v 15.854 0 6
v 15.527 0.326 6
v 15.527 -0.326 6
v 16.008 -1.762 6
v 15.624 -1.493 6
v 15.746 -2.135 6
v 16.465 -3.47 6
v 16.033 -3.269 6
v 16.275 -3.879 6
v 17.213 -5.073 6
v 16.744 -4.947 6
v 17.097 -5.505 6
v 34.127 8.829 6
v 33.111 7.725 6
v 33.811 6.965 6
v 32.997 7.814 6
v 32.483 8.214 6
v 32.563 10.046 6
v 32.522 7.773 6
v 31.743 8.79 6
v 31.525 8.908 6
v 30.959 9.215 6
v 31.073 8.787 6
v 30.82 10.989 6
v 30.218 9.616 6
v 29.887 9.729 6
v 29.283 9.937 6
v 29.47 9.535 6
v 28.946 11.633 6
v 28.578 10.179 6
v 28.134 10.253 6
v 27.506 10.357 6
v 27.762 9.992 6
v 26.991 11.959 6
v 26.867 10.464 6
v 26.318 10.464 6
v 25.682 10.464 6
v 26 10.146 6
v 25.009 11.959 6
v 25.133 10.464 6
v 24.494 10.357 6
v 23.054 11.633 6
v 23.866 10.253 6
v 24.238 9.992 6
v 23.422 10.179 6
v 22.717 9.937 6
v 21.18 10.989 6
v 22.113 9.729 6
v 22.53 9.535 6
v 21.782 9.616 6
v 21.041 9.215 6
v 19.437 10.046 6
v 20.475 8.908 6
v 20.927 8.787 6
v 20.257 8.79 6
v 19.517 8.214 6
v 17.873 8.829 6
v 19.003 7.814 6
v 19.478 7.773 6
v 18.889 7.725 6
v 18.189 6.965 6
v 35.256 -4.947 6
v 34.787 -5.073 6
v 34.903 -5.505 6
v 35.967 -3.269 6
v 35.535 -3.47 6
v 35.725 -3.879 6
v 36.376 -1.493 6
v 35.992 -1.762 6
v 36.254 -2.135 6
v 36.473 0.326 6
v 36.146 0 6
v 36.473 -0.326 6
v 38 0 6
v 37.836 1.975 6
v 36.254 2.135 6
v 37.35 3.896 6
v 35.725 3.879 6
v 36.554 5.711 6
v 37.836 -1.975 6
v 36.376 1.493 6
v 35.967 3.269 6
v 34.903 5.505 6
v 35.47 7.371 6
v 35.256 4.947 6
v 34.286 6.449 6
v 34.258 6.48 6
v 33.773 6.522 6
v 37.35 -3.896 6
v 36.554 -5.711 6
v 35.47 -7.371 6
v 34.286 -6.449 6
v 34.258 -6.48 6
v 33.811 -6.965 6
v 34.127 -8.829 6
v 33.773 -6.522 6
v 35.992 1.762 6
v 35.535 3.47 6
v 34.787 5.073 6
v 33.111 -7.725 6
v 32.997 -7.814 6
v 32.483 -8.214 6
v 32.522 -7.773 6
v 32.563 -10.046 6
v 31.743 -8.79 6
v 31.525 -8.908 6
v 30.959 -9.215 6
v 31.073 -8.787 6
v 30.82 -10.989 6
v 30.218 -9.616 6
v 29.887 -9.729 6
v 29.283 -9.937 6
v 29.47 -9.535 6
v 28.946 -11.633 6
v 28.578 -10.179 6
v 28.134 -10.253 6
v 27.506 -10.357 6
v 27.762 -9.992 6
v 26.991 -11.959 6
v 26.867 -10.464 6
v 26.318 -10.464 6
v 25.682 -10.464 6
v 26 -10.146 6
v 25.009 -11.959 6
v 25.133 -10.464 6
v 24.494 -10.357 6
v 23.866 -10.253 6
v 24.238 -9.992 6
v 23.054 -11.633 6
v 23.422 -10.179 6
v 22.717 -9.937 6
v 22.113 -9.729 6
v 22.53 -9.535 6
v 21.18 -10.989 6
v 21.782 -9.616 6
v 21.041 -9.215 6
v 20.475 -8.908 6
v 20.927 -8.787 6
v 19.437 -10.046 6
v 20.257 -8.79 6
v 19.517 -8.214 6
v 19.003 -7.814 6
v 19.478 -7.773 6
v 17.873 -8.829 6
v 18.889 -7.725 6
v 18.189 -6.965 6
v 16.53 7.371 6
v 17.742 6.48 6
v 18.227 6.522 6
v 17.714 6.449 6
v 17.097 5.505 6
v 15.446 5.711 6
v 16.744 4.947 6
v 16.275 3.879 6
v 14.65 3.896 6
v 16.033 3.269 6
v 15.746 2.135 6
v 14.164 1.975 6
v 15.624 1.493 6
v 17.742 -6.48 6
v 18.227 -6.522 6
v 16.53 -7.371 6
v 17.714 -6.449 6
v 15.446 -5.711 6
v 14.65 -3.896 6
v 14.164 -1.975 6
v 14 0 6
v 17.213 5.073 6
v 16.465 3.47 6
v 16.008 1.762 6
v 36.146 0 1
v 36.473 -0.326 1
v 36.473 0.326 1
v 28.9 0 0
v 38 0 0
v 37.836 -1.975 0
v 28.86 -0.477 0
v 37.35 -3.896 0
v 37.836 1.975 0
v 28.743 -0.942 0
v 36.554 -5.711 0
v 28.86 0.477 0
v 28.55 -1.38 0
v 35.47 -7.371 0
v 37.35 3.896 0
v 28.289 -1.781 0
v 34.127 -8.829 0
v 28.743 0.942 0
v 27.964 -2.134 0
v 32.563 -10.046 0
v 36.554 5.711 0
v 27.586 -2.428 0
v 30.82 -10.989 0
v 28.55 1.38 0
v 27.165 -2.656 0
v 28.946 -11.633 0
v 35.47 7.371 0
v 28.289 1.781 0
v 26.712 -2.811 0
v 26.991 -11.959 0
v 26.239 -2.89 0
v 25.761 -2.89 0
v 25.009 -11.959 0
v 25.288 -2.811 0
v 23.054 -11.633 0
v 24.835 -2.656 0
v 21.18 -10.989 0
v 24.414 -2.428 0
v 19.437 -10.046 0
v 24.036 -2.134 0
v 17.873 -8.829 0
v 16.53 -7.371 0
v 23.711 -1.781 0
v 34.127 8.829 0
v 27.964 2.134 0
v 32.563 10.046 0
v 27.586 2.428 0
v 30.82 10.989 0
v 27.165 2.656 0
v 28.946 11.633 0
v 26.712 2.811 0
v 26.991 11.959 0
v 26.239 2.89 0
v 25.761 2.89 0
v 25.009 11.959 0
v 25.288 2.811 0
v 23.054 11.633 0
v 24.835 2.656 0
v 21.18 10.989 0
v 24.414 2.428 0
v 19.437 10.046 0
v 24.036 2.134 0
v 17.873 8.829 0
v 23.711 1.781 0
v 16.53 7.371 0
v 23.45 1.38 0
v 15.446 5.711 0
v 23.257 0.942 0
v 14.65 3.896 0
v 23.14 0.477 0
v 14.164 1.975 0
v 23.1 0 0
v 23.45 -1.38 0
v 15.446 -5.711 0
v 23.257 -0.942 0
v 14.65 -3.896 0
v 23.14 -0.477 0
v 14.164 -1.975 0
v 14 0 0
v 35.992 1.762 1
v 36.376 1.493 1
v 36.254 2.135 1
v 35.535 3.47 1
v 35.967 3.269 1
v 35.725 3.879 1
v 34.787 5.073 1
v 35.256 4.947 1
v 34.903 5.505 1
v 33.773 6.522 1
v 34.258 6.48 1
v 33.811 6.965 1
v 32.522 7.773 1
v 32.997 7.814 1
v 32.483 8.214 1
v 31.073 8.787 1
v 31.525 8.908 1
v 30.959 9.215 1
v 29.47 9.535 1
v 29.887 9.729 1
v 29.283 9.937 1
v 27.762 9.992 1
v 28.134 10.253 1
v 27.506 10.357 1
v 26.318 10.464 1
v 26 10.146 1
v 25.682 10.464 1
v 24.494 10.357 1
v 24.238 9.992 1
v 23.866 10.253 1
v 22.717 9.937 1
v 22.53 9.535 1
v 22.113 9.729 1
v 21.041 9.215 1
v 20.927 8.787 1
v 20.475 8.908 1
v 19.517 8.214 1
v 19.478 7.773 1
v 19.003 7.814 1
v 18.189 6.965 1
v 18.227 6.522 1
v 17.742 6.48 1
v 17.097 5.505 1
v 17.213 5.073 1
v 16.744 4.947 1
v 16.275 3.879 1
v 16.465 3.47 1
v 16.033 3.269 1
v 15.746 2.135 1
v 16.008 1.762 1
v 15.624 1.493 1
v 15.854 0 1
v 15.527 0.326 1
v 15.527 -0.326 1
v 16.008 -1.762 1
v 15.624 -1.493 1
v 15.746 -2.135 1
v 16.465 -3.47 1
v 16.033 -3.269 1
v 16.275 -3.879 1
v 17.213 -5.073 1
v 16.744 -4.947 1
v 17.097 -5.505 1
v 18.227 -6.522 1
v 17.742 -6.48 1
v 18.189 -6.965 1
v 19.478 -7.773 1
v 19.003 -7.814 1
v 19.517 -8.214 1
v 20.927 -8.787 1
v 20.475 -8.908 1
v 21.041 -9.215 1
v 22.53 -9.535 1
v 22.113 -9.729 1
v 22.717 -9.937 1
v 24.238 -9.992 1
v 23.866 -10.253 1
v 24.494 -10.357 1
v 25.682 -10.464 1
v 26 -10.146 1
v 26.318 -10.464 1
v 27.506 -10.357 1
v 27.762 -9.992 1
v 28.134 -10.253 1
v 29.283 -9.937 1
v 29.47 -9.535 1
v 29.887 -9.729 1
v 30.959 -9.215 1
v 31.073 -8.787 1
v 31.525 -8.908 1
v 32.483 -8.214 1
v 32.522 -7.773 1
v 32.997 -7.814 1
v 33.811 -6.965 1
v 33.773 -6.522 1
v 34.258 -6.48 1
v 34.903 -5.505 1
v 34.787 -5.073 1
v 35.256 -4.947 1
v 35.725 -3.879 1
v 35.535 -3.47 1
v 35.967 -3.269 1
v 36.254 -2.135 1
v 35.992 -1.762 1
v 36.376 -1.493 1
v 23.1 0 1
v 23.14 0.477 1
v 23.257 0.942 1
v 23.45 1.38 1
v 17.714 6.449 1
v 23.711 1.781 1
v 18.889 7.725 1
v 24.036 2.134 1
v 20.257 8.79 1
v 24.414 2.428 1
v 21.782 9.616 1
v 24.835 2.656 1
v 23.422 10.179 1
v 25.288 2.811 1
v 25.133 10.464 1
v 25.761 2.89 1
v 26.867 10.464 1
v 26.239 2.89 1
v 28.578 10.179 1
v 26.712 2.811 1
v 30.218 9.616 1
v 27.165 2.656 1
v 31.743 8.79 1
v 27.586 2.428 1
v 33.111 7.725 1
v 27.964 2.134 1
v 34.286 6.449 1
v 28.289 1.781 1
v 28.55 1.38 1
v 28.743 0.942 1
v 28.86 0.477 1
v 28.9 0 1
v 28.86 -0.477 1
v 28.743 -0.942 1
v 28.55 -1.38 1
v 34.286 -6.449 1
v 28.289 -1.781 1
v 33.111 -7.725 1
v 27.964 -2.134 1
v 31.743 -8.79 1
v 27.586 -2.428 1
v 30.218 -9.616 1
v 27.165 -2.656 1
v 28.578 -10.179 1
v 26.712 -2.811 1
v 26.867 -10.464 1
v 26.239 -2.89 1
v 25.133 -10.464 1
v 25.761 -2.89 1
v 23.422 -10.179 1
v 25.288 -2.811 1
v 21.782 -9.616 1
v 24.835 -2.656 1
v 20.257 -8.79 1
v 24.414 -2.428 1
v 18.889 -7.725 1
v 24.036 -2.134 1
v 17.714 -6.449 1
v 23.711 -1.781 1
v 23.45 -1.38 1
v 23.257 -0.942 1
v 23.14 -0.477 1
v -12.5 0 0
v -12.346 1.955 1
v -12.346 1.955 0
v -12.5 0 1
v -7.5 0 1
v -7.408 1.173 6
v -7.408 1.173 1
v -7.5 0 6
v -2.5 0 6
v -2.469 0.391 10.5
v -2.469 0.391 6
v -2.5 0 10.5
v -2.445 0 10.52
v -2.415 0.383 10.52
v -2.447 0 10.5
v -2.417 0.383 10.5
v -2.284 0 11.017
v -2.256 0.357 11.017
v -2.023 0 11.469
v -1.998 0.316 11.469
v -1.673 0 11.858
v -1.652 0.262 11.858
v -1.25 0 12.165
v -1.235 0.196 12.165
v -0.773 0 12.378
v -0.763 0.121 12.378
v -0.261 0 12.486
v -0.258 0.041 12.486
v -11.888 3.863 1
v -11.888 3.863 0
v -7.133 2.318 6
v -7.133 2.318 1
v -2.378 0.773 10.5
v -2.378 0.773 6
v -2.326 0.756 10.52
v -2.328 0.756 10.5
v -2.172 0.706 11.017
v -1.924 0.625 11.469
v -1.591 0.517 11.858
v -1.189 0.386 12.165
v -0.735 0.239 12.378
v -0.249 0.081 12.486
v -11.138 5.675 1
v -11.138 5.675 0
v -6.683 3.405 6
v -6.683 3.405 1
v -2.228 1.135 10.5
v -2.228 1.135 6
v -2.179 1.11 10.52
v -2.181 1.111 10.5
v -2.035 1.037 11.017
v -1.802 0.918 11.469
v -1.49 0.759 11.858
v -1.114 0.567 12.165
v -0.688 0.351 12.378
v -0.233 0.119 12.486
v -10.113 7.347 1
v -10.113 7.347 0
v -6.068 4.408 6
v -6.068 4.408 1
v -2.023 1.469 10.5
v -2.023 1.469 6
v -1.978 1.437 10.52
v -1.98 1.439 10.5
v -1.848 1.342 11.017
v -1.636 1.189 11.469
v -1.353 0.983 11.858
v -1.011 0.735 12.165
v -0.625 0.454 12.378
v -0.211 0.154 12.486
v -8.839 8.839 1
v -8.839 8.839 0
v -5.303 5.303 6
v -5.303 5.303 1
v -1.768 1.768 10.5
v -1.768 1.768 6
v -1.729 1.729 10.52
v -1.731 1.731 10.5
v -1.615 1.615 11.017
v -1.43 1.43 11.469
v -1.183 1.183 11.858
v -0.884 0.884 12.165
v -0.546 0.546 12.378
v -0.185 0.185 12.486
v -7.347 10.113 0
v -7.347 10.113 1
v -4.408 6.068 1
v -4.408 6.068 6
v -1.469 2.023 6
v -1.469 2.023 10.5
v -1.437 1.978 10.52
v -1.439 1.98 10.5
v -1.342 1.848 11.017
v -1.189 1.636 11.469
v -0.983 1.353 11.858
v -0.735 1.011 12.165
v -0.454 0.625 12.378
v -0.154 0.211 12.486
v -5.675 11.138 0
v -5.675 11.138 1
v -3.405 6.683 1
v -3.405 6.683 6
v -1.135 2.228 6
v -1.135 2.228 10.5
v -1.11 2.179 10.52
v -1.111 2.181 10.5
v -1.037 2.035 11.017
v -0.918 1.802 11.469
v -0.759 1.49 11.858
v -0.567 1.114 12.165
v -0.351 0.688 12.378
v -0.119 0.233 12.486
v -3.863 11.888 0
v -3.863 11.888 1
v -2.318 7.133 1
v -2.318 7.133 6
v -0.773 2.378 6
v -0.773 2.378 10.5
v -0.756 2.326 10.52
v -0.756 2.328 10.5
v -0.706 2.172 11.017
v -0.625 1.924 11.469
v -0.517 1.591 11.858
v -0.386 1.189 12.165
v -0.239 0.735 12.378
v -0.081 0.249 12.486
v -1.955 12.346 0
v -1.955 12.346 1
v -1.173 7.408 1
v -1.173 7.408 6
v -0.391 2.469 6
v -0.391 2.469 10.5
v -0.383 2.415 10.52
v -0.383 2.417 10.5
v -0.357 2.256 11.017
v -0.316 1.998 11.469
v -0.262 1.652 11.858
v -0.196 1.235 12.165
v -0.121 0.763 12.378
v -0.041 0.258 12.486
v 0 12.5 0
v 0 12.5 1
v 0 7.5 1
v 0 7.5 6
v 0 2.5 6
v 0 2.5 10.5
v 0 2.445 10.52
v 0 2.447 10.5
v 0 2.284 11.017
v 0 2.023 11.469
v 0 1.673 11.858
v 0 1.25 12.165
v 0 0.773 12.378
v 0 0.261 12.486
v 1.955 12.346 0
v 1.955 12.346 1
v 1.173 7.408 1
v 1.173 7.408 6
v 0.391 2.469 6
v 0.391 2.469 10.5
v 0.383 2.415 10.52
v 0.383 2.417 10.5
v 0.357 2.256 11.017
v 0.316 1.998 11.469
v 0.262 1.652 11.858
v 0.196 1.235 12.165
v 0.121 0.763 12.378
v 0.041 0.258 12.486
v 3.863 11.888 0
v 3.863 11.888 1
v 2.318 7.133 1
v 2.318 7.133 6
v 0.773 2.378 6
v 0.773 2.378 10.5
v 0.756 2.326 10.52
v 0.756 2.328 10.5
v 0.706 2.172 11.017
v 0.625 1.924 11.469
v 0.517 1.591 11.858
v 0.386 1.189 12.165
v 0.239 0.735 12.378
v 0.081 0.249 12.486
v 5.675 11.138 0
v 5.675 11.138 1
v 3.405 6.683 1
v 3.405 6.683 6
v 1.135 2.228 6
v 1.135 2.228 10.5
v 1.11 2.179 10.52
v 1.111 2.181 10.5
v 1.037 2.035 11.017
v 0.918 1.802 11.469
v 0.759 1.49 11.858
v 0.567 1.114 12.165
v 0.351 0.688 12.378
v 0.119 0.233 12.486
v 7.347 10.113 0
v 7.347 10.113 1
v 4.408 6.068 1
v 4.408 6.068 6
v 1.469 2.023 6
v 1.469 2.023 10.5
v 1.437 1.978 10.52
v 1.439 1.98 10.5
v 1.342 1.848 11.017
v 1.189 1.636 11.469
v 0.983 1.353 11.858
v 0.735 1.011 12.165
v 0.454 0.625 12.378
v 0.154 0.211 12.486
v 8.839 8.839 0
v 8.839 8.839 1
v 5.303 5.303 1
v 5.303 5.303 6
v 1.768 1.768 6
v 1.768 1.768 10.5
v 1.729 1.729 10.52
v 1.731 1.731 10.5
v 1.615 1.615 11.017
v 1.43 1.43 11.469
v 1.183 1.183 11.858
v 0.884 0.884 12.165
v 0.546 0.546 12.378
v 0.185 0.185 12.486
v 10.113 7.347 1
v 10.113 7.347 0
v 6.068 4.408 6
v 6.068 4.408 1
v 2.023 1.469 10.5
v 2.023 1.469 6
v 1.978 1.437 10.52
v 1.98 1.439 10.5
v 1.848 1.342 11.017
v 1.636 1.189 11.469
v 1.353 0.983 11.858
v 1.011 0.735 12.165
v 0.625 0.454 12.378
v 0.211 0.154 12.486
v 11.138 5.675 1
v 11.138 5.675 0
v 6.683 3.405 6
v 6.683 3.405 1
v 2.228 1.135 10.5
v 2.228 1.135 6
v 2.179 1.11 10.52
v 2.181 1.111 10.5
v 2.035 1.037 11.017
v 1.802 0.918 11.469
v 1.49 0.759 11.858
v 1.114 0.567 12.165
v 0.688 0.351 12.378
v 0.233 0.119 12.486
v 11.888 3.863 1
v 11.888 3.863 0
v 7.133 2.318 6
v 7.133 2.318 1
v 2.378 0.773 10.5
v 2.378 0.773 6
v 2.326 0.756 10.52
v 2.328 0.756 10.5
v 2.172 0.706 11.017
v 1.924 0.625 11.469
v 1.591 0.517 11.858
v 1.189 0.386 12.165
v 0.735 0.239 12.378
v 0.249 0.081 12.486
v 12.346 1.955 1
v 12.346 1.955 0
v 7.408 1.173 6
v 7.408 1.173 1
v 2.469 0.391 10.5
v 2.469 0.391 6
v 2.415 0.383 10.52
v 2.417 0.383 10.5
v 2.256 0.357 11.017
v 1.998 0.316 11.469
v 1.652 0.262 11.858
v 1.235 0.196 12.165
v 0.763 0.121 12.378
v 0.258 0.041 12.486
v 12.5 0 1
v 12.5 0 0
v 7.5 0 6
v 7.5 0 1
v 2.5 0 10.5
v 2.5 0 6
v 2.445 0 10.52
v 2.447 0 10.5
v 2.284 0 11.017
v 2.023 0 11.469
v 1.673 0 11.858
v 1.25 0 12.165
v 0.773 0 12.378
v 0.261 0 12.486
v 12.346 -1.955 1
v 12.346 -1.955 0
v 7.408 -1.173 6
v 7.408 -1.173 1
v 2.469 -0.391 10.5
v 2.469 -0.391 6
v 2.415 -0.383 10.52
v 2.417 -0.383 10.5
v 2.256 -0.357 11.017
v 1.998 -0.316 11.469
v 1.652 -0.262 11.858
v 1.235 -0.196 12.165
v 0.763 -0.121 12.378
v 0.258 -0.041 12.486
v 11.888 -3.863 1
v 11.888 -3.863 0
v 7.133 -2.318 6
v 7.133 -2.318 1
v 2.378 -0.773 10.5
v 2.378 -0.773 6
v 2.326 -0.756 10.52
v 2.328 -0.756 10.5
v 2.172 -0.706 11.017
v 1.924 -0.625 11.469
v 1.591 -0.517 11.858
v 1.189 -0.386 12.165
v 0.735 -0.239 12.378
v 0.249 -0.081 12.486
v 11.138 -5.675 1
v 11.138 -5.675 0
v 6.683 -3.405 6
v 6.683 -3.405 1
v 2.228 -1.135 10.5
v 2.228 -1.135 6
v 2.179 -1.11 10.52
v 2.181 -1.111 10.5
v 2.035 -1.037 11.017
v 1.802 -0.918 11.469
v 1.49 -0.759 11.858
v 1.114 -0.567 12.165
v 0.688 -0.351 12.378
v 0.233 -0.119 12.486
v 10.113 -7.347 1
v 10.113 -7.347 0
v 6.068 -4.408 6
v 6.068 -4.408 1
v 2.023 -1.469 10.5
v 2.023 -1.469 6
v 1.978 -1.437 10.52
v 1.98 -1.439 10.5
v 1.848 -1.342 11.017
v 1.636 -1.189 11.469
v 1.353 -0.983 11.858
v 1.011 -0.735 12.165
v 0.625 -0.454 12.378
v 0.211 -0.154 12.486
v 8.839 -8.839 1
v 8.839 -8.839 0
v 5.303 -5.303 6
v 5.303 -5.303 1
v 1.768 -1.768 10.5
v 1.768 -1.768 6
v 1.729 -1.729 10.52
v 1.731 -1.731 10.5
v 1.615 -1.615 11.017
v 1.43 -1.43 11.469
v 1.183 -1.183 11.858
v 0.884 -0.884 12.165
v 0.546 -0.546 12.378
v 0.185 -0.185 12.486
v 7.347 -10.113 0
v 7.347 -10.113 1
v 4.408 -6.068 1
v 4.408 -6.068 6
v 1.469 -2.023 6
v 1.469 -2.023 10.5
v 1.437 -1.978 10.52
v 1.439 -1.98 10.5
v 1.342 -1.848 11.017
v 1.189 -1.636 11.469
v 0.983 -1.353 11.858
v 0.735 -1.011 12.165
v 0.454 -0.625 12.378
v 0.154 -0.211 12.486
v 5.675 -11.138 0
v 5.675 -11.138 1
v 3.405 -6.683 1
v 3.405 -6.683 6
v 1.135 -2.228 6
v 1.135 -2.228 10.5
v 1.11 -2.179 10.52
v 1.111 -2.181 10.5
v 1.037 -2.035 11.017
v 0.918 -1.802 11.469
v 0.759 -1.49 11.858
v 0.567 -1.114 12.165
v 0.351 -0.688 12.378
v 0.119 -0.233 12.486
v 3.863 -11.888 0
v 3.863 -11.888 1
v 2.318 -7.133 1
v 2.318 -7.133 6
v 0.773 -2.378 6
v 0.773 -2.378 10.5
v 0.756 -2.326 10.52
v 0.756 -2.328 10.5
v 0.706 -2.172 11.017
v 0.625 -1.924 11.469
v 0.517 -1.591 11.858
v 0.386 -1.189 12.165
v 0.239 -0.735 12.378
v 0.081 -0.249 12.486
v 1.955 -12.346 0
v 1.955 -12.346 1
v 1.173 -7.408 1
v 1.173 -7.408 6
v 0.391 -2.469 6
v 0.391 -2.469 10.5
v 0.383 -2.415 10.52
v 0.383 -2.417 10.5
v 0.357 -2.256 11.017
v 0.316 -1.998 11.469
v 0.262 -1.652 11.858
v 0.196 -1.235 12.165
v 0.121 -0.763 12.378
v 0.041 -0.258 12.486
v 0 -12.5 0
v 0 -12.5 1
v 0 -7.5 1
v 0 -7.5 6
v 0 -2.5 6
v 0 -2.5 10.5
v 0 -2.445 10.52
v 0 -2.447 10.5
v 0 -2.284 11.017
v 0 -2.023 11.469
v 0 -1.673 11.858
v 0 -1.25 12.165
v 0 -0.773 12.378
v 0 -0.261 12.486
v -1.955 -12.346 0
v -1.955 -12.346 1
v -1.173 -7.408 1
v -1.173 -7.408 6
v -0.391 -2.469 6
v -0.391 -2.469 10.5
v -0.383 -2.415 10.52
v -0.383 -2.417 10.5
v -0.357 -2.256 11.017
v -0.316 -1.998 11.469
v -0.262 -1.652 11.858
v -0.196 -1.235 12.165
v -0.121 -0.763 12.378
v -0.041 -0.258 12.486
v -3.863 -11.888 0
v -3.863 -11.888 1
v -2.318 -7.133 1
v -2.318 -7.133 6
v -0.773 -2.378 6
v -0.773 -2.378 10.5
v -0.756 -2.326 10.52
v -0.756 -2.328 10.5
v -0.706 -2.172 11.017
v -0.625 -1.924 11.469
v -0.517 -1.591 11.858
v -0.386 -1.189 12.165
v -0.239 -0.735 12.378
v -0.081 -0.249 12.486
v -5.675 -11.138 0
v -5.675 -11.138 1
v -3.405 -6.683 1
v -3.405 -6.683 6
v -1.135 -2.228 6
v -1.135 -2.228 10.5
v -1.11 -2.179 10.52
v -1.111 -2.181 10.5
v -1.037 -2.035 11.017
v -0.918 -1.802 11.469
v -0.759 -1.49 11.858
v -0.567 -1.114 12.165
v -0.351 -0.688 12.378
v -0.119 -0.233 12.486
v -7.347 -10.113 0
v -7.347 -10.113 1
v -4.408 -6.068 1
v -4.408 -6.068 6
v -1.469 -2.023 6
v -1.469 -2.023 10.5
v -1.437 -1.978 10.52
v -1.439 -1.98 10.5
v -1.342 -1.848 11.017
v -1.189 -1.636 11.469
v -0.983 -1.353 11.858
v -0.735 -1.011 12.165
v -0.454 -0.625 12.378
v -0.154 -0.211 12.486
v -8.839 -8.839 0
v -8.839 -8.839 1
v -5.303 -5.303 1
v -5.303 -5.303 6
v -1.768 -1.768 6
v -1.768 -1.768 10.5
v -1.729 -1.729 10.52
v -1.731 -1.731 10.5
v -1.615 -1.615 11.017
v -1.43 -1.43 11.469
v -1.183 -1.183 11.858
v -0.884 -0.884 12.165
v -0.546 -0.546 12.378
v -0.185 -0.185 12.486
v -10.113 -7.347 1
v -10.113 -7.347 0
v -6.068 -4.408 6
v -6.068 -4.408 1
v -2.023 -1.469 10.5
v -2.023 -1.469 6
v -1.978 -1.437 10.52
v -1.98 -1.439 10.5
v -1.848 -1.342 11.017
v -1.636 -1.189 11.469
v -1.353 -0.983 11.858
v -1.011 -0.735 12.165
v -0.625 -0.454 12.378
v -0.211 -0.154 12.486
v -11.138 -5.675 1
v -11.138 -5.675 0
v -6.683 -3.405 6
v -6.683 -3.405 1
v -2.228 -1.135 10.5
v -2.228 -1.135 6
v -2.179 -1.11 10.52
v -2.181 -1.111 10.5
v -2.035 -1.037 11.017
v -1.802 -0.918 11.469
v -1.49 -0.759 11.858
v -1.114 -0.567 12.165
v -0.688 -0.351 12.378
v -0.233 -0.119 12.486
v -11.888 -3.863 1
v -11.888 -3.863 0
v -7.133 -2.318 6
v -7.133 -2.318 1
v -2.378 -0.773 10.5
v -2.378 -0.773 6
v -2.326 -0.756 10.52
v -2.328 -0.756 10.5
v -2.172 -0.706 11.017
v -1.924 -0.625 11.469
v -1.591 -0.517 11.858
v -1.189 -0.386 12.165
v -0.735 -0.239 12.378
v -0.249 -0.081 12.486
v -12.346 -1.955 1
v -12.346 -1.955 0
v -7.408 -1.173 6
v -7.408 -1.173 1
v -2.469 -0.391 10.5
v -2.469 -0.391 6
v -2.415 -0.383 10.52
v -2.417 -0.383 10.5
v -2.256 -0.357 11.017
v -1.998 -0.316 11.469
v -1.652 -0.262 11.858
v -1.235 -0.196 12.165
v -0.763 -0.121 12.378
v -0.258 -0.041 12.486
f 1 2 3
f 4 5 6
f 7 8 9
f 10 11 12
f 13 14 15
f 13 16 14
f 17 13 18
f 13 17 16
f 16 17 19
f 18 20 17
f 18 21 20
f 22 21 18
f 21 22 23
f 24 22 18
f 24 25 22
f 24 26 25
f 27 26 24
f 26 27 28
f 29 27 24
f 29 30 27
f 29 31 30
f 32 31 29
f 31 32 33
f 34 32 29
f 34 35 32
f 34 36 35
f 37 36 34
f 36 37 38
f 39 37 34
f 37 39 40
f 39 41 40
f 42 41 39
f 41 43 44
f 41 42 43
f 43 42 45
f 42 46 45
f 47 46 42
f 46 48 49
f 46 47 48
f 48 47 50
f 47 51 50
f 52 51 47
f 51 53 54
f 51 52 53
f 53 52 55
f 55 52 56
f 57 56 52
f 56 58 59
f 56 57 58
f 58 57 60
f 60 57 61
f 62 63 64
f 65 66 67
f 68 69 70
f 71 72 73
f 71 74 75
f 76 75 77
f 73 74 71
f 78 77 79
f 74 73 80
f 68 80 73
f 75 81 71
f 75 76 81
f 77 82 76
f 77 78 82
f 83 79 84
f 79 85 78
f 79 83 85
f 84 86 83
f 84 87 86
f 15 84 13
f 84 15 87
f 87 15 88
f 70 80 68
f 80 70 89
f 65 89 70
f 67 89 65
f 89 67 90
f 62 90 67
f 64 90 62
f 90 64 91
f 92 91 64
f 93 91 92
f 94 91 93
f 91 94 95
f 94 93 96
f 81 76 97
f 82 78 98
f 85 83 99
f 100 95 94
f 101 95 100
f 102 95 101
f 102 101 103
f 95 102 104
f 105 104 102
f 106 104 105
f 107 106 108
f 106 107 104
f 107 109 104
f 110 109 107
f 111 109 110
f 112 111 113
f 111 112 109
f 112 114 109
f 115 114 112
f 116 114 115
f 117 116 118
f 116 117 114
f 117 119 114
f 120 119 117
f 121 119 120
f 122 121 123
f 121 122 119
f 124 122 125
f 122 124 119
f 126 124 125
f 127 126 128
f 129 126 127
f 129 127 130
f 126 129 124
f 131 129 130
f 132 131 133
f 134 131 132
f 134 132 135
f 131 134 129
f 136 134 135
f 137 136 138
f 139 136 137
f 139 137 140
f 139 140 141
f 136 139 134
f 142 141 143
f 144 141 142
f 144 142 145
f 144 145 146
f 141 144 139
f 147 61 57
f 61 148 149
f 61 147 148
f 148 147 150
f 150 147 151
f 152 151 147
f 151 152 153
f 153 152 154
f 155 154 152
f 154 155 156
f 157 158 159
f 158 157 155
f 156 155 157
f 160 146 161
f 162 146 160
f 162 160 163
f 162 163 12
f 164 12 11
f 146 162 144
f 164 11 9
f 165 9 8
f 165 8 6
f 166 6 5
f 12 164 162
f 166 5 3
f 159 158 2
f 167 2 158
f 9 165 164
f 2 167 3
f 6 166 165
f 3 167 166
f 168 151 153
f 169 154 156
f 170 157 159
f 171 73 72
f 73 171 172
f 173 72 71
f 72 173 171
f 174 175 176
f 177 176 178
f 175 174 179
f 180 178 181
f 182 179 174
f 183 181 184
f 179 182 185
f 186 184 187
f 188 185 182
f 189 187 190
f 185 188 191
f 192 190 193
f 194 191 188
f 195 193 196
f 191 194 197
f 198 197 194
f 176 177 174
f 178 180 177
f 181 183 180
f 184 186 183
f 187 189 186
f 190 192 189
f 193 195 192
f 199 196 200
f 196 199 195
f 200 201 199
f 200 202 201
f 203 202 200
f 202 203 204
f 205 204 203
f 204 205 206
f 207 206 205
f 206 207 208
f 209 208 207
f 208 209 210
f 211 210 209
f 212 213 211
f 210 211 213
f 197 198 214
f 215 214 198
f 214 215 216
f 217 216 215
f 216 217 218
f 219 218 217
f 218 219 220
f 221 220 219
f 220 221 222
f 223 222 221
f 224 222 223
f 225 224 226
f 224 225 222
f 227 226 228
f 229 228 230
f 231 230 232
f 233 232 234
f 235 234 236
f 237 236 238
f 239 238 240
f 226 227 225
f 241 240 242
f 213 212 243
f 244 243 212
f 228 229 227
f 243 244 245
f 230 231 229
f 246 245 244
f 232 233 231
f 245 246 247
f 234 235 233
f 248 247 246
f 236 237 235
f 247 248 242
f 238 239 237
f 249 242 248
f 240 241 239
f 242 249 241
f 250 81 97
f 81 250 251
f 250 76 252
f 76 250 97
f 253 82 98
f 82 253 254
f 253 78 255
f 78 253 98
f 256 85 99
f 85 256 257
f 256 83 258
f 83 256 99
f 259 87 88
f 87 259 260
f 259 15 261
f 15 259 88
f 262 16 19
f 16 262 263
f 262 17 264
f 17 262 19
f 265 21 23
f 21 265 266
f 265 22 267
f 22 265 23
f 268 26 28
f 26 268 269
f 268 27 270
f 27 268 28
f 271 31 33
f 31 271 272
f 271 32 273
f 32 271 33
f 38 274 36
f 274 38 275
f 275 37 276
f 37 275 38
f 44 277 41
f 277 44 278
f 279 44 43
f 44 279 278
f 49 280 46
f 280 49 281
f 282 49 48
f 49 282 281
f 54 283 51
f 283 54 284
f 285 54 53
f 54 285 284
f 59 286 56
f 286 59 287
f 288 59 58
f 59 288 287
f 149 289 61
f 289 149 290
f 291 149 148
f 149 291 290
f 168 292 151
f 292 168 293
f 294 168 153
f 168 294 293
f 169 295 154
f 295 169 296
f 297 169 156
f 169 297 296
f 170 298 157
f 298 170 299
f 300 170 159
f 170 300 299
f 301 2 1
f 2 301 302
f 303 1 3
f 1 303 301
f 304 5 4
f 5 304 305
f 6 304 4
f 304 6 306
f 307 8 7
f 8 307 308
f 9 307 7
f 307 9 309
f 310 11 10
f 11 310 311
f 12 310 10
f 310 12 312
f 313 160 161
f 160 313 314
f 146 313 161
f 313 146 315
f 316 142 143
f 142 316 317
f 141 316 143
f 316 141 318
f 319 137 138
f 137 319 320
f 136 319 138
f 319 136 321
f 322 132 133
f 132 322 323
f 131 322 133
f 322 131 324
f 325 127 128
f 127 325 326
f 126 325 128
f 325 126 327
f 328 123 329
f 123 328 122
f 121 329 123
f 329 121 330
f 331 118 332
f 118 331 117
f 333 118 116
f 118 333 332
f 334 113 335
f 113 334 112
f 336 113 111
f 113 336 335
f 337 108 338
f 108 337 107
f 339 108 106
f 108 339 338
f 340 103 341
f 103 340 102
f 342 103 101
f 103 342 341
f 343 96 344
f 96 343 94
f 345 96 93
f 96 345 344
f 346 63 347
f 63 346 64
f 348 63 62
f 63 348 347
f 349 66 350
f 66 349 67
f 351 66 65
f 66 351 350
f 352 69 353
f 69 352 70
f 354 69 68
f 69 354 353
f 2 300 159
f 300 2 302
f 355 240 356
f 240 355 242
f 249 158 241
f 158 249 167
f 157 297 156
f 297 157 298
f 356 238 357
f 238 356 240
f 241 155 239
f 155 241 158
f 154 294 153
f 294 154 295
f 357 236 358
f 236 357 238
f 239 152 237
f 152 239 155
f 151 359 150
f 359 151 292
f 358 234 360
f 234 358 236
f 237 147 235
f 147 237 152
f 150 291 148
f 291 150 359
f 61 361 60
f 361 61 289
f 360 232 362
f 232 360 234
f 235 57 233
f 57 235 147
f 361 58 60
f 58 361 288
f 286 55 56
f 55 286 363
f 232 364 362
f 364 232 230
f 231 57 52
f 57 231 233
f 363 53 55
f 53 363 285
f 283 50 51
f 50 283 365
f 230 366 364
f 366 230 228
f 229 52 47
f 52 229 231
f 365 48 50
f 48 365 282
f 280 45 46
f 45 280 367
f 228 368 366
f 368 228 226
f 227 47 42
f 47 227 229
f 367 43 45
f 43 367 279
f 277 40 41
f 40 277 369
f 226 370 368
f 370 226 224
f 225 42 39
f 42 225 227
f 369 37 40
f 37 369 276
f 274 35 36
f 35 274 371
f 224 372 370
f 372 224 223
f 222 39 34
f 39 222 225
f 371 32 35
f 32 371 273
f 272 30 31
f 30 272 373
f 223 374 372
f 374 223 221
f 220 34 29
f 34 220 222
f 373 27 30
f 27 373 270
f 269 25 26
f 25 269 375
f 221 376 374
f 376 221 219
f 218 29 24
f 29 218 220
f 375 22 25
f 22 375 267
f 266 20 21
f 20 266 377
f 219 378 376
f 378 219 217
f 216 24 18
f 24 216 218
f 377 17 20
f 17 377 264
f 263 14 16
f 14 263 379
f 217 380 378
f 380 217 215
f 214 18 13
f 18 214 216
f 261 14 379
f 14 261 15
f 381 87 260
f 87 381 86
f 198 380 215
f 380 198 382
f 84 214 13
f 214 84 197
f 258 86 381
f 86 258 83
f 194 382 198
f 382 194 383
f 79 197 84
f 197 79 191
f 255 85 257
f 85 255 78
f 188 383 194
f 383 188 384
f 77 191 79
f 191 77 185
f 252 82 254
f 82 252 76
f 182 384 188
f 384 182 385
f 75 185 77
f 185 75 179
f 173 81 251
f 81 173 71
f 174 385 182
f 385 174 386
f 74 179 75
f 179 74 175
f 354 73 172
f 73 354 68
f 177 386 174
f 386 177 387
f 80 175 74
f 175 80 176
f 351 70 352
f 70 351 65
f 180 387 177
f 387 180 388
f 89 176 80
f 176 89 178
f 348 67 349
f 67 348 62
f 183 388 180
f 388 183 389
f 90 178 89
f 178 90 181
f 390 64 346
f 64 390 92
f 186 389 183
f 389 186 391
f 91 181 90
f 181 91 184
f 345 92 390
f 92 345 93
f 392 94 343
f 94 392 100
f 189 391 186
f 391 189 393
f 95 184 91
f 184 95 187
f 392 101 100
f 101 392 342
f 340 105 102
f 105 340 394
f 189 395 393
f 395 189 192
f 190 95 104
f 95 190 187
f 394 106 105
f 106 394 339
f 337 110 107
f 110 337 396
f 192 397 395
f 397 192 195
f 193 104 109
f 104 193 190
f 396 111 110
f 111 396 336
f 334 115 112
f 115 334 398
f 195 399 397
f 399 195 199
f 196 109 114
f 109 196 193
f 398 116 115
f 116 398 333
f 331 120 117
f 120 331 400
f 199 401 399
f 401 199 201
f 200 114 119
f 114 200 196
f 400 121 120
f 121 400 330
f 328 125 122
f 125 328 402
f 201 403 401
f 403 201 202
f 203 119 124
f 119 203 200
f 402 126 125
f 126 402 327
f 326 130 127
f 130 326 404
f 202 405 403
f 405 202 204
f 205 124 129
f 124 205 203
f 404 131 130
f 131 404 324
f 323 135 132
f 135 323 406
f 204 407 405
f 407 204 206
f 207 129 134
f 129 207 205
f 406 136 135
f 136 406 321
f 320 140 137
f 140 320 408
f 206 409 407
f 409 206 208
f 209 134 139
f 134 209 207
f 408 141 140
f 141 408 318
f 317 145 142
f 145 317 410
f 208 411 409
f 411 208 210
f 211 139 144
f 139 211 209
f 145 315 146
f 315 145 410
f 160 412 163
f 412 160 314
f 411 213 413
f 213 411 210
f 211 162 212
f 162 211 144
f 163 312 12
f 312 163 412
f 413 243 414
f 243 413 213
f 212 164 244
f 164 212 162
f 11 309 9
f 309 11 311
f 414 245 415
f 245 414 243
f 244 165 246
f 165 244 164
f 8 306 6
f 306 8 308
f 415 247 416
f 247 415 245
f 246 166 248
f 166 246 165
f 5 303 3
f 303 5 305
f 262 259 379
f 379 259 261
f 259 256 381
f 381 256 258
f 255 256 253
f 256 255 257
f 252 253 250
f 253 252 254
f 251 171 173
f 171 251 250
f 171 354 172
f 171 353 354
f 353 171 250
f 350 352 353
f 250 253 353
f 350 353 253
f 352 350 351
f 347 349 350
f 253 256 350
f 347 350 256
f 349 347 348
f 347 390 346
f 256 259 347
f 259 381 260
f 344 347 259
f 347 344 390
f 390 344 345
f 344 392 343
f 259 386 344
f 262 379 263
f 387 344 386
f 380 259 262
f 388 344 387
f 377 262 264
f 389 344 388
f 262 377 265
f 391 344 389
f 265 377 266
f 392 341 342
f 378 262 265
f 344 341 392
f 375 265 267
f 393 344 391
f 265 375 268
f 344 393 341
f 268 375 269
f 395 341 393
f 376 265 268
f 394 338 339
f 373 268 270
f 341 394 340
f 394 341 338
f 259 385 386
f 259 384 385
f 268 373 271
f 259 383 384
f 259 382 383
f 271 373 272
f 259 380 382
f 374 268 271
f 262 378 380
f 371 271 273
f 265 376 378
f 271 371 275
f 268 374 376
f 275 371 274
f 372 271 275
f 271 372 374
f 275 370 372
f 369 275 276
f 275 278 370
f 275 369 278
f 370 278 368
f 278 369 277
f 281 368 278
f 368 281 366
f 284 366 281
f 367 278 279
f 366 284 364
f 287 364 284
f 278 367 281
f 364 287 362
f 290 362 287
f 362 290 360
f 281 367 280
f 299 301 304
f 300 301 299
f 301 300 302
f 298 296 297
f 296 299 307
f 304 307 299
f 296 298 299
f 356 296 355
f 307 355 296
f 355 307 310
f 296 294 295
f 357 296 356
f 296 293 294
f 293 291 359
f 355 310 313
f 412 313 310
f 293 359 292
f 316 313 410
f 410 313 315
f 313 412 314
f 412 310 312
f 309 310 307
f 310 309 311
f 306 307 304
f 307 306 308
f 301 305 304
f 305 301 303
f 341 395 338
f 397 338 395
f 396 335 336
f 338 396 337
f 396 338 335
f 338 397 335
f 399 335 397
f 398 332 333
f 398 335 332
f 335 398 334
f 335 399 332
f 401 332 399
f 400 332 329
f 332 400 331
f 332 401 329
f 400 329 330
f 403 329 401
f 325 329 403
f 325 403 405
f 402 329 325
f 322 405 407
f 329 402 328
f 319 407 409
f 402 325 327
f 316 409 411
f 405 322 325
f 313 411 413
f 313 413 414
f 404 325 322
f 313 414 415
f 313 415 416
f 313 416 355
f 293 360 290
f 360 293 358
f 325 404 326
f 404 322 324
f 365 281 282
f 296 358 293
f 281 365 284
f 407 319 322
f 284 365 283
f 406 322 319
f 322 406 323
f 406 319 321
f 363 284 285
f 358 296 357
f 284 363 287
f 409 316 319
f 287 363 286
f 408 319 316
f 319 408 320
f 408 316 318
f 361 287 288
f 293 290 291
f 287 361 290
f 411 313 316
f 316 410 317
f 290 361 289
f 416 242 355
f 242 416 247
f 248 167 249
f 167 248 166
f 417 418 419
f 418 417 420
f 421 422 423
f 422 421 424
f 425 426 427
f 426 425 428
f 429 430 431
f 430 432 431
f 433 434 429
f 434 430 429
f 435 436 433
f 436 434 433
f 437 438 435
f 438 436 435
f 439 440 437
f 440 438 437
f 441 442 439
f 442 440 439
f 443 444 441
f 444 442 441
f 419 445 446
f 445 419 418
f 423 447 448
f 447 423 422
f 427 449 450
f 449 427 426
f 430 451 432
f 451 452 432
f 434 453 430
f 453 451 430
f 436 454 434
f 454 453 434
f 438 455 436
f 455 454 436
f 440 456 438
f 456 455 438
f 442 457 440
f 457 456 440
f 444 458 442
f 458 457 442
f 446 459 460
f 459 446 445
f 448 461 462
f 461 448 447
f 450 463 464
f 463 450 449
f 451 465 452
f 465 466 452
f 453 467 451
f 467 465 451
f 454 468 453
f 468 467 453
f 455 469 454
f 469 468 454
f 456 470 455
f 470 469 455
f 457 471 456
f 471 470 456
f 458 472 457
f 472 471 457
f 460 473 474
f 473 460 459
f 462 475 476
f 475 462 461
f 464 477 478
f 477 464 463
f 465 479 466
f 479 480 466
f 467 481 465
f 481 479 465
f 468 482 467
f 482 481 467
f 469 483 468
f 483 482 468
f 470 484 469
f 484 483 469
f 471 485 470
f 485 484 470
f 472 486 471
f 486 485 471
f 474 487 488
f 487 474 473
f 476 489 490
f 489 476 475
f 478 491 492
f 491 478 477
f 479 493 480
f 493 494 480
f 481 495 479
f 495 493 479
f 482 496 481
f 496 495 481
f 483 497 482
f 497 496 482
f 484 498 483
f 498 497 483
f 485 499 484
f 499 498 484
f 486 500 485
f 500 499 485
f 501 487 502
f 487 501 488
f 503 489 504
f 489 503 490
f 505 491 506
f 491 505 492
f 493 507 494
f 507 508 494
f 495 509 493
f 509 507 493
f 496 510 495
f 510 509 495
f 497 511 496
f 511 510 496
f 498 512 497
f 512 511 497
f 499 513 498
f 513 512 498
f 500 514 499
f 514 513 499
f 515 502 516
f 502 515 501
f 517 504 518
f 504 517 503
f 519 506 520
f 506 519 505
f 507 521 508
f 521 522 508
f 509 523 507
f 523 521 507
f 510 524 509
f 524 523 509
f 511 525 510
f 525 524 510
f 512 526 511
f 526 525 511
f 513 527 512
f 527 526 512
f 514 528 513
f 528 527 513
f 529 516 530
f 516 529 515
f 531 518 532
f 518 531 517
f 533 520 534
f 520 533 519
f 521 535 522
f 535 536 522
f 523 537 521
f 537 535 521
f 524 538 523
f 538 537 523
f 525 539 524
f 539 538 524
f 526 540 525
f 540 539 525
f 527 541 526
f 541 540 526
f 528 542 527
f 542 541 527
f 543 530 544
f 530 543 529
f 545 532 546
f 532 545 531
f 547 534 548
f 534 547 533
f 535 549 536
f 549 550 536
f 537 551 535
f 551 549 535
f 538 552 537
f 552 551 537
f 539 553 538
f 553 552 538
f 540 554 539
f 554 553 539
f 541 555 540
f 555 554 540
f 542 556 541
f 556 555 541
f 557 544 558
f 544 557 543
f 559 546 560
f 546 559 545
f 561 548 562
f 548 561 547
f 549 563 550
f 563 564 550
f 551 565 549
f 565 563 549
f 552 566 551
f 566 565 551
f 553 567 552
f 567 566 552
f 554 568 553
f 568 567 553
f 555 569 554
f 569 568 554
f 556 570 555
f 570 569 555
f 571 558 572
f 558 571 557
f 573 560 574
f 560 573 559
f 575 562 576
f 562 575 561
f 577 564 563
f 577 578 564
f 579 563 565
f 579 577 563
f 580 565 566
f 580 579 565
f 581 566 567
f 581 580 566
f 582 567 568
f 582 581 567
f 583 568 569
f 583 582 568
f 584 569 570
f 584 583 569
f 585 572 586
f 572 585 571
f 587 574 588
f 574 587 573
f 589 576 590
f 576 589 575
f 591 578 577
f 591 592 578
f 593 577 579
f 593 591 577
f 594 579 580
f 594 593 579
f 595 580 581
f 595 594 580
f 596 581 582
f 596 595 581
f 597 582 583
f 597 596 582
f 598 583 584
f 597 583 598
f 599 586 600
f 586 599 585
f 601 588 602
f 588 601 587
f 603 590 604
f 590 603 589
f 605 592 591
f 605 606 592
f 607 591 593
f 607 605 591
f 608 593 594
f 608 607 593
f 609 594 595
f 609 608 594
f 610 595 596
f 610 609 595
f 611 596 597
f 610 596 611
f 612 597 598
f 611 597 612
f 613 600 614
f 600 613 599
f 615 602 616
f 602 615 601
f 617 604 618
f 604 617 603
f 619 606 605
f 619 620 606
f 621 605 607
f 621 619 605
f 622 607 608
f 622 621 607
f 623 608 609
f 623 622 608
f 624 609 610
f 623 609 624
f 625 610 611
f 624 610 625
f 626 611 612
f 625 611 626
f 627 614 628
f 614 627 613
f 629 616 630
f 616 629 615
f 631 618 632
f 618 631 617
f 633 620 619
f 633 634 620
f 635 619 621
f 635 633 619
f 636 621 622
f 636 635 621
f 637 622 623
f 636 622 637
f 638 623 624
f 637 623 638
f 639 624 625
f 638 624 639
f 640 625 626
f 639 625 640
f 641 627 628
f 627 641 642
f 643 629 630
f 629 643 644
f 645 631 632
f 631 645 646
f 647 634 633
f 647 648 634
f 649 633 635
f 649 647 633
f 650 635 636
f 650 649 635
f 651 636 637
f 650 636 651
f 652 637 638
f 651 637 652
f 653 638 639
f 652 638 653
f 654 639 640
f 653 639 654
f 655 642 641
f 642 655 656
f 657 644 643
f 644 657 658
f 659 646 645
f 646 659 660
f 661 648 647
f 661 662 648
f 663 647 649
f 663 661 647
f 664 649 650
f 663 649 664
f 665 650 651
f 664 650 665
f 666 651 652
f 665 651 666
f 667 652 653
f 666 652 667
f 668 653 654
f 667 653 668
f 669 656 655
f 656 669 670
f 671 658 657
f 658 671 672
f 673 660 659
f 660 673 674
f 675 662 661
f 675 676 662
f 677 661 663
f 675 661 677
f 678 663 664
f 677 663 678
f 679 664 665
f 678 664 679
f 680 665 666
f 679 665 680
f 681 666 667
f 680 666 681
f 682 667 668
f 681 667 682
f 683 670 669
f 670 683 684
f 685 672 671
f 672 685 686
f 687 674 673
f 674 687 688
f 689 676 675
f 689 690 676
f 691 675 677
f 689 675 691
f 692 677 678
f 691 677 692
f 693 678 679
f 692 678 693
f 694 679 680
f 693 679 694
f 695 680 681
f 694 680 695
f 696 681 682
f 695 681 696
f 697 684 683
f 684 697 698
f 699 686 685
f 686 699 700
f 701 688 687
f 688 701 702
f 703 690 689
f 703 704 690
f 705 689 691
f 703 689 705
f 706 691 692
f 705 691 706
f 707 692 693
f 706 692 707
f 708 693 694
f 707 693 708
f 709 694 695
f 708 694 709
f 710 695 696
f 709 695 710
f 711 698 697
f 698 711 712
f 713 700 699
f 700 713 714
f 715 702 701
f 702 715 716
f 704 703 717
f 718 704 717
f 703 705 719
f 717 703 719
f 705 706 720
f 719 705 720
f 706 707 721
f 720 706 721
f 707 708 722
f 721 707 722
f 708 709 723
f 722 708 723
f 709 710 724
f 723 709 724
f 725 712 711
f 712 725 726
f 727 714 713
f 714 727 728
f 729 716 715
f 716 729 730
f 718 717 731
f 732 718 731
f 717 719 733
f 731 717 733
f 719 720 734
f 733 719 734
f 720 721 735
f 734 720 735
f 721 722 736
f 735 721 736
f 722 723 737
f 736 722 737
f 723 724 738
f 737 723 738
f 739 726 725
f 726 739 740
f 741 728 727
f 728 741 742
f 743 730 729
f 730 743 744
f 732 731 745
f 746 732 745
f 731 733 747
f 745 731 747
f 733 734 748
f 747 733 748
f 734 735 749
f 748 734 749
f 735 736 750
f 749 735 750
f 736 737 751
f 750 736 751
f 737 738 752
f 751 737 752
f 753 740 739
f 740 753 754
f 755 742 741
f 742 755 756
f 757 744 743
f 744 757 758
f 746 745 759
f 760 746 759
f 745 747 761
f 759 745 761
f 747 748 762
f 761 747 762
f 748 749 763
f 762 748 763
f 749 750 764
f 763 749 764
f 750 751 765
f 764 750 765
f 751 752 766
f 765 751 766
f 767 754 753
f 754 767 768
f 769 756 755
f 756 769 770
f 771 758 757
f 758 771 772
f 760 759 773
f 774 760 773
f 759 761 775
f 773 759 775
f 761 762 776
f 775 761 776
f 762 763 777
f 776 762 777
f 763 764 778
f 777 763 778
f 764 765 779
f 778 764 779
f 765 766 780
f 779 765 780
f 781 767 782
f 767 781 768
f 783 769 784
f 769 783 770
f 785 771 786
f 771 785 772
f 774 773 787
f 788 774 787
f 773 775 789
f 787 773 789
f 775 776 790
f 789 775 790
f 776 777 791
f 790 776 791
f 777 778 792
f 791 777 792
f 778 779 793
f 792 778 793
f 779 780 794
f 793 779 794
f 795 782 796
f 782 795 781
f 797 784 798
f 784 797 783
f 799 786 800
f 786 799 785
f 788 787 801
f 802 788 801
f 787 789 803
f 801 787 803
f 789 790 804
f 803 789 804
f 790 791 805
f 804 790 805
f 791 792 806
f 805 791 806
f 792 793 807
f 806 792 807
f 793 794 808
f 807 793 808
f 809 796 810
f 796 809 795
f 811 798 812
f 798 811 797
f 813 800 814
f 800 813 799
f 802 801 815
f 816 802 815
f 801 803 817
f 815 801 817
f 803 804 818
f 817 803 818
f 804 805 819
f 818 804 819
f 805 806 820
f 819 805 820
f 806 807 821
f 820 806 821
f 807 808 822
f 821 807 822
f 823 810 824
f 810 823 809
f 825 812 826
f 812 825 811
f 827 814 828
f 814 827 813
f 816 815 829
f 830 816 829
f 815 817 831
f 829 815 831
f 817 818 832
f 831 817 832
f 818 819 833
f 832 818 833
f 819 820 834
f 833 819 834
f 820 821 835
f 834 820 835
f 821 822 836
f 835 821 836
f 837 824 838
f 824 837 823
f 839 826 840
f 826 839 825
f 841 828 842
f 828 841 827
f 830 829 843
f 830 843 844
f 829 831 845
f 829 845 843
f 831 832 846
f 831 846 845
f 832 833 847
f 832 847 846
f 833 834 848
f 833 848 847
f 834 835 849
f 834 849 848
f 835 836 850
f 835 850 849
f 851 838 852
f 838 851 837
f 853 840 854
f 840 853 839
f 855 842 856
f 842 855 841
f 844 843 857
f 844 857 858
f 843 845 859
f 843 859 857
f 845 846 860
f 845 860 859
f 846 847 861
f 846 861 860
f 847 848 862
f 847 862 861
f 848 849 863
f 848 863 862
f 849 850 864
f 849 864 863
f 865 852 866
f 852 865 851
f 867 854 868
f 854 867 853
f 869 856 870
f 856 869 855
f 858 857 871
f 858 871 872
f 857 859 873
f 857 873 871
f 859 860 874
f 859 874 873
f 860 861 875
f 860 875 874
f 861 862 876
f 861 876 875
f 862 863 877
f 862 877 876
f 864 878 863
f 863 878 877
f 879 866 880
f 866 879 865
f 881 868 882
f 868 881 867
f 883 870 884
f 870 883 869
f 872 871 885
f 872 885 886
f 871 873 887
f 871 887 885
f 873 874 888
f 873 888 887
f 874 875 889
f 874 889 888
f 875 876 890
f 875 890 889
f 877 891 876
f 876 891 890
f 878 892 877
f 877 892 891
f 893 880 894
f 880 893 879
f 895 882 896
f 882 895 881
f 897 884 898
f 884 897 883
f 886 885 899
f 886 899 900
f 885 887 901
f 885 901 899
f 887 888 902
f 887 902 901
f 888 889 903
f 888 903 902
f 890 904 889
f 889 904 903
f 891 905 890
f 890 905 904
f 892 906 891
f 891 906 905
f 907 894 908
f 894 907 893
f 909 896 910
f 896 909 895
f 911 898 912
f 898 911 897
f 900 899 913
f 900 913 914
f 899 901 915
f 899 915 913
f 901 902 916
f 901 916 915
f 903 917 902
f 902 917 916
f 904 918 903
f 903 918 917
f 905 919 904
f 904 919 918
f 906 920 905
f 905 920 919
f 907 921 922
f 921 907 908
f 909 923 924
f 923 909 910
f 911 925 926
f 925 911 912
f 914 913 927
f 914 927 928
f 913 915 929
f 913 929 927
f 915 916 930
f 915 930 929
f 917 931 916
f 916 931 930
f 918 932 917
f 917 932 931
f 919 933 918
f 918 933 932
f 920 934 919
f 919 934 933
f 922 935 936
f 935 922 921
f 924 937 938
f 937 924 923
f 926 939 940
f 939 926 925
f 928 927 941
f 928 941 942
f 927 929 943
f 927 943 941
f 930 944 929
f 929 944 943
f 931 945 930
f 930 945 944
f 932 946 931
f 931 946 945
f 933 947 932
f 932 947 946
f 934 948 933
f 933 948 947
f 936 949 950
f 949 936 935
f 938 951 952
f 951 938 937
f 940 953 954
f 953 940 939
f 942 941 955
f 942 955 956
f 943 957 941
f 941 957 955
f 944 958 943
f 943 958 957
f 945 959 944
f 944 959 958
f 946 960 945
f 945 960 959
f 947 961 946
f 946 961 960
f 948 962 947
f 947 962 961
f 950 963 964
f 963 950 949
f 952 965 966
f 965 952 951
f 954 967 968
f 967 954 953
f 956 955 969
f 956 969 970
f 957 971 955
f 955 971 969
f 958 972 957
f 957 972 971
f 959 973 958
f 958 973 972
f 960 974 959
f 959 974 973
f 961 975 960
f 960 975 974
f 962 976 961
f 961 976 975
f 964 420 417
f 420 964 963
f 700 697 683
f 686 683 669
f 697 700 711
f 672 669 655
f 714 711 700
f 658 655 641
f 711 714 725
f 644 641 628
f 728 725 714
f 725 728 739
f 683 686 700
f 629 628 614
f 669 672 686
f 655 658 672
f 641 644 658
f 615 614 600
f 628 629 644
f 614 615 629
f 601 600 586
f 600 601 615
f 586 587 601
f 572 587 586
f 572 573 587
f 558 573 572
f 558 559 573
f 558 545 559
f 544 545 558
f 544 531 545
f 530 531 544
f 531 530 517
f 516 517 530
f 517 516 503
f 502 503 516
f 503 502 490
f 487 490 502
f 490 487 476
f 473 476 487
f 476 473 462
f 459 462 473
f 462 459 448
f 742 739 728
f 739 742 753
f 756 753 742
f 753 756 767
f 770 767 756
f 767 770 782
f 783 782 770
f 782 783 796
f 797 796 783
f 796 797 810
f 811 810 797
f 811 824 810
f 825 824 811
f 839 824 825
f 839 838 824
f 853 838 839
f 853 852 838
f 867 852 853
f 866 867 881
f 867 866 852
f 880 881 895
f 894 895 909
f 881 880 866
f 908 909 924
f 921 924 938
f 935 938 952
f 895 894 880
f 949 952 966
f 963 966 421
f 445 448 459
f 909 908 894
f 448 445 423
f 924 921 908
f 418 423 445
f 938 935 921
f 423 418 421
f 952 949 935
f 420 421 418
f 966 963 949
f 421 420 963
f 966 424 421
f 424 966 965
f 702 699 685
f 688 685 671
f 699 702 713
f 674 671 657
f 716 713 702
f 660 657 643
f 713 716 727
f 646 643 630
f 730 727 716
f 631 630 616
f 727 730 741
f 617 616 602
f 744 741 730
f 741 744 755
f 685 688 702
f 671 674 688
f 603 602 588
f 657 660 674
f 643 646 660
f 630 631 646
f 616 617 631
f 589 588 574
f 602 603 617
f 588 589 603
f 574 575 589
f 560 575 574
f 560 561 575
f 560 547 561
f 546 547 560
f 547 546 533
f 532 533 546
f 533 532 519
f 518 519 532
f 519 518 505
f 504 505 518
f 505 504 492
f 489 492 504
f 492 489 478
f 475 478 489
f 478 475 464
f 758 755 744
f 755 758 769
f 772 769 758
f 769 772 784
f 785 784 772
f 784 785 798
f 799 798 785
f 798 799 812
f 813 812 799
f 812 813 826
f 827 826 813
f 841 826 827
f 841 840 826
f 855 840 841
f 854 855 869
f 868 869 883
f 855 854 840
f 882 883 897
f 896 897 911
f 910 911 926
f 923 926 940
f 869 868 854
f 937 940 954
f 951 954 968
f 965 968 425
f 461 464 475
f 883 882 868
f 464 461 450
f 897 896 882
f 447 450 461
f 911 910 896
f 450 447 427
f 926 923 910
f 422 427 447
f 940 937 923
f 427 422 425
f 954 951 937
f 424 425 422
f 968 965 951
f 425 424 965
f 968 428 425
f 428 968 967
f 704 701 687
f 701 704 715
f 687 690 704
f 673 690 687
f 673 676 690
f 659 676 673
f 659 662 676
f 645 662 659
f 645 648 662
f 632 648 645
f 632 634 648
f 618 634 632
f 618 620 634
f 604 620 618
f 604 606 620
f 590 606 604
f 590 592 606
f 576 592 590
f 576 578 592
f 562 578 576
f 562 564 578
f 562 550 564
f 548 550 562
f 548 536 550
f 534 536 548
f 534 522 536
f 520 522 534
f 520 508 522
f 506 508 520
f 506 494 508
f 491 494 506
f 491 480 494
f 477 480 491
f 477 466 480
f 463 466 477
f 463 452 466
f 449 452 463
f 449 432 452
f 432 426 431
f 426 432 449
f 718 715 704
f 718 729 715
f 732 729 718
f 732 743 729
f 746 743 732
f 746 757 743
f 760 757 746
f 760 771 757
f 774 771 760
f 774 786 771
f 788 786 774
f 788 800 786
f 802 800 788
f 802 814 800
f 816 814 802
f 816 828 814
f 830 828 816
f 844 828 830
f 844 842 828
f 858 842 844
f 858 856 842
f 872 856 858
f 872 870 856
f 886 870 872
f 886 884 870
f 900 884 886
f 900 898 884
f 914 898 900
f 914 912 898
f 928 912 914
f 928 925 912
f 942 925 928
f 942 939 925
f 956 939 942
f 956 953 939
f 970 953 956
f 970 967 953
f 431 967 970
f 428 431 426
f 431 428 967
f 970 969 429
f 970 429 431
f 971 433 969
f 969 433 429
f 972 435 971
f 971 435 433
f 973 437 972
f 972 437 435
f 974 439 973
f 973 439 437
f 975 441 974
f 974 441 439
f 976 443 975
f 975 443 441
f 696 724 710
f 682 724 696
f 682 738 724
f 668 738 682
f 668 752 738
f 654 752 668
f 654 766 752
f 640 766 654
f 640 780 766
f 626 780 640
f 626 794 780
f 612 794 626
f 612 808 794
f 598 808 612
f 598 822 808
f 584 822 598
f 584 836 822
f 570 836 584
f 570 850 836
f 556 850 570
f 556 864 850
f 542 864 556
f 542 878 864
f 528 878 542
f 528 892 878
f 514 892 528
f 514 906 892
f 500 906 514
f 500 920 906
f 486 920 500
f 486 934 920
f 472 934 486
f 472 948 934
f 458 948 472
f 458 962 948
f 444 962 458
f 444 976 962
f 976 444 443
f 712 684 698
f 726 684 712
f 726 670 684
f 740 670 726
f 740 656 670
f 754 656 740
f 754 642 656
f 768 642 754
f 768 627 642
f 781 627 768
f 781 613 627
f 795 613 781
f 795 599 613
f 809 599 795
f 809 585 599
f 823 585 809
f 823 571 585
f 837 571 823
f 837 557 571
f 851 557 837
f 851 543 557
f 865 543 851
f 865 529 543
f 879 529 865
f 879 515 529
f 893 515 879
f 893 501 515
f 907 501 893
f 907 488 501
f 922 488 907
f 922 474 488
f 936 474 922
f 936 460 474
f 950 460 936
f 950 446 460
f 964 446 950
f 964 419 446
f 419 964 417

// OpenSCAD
// file: inc/bevel_lib.scad
// Bevelled boxes, etc
module roundedbox(size=[1.0, 1.0, 1.0, ], radius = 0.1) {
    hull() {
        for (x = [radius, size[0] - radius]) {
            for (y = [radius, size[1] - radius]) {
                for (z = [radius, size[2] - radius]) {
                    translate([x,y,z])
                        sphere(r=radius);
                }
            }
        }
    }
}

module rounded_square_centered(size=[1,1], radius=0.1) {
    hull() {
        for (x = [- size[0] / 2 + radius, size[0] / 2 - radius]) {
            for (y = [- size[1] / 2 + radius, size[1] / 2 - radius]) {
                translate([x,y]) circle(radius);
            }
        }
    }
}

module bevelled_square(size=[1,1], radius=0.1) {
    polygon(points=[
            // Left
            [0, radius ],
            [0, size[1] - radius ],
            // Top
            [radius, size[1]],
            [size[0] - radius, size[1]],
            // Right
            [size[0], size[1] - radius],
            [size[0], radius],
            // Bot
            [size[0] -radius, 0],
            [radius, 0]
        ]);
}

// Bevelled in x and y axes.
module bevelledbox(size=[1,1,1], radius=0.1) {
    linear_extrude(height=size[2]) {
        // 8-sided polygon
        polygon(points=[
            // Left
            [0, radius ],
            [0, size[1] - radius ],
            // Top
            [radius, size[1]],
            [size[0] - radius, size[1]],
            // Right
            [size[0], size[1] - radius],
            [size[0], radius],
            // Bot
            [size[0] -radius, 0],
            [radius, 0]
            ]);
    }
}

module bevelledbox_y(size=[1,1,1], radius=0.1) {
    // Bevelled around y
    translate([0,0,size[2]])
        rotate(-90, [1,0,0])
            bevelledbox([size[0], size[2], size[1]], radius); 
}

module bevelledbox_x(size=[1,1,1], radius=0.1) {
    // Bevelled around x
    translate([size[0],0,0])
        rotate(-90, [0,1,0])
            bevelledbox([size[2], size[1], size[0]], radius); 
}

// Draw origin-centred, unit polyhedron.
module octahedron(C0=1.0) {
    polyhedron(points = [
        [0.0, 0.0,  C0],
        [0.0, 0.0, -C0],
        [ C0, 0.0, 0.0],
        [-C0, 0.0, 0.0],
        [0.0,  C0, 0.0],
        [0.0, -C0, 0.0]
        ],
        faces = [
[ 4 , 2, 0],
[ 3 , 4, 0],
[ 5 , 3, 0],
[ 2 , 5, 0],
[ 5 , 2, 1],
[ 3 , 5, 1],
[ 4 , 3, 1],
[ 2 , 4, 1]
        ]
    );
}

module fullybevelledbox(size=[1,1,1], radius=0.1) {
    hull() {
        for (x = [radius, size[0] - radius]) {
            for (y = [radius, size[1] - radius]) {
                for (z = [radius, size[2] - radius]) {
                    translate([x,y,z])
                        octahedron(radius);
                }
            }
        }
    }
}
// main file
use <inc/bevel_lib.scad>;

// $fa is related to arcs
$fa = 0.8; // millimetres

// This radius should be a little less than our wheels, to allow for
// stretching. 
wheel_radius = 7.5;
wheel_width = 5.0;

tyre_thickness = 3.0; // Includes knobbles

button_radius = 2.5;

/*
 * To make a tyre mould, we need two pieces, outer and inner.
 */
 
module mould_inner()
{
    //  This will be the "correct way up"
    rotate_extrude(convexity=3) {
        square([wheel_radius + 5, 1]);
        square([wheel_radius, wheel_width + 1]);
        // Piece to push to release the mould.
        translate([0,wheel_width +0.5]) {
            square([button_radius,5]);
        }
        translate([0,wheel_width +5]) {
            intersection() {
                square([5,5]);
                circle(button_radius, $fn=30);
            }
        }
    }
    // translate([0,0,wheel_width+4.5]) {
    //     sphere(2.0);
    // }
}

module mould_outer()
{
    // This will be upside-down.
    overall_height = wheel_width + 1;
    hole_radius = button_radius + 0.4;
    side_thickness = 1.5;
    rotate_extrude(convexity=3) {
        // Base
        translate([hole_radius,0])
            square([wheel_radius + tyre_thickness - hole_radius, 1]);
        // Side wall
        translate([wheel_radius + tyre_thickness, 0]) {
              square([side_thickness, wheel_width+1]);
        }
    }
    knobble_size = 0.5;
    knobble_count = 36;
    // Knobbly tread
    for(ang = [0:(360 / knobble_count) :360]) {
        rotate([0,0,ang]) {
            translate([wheel_radius + tyre_thickness,0,overall_height / 2]) {
                rotate([0,0,45])
                    cube([knobble_size,knobble_size, overall_height], center=true);
            }
        }
    }
}

module main()
{
    union() {
        mould_inner();
        translate([wheel_radius * 2 + tyre_thickness + 8,0,0]) {
            mould_outer();
        }
    }
}

main();
